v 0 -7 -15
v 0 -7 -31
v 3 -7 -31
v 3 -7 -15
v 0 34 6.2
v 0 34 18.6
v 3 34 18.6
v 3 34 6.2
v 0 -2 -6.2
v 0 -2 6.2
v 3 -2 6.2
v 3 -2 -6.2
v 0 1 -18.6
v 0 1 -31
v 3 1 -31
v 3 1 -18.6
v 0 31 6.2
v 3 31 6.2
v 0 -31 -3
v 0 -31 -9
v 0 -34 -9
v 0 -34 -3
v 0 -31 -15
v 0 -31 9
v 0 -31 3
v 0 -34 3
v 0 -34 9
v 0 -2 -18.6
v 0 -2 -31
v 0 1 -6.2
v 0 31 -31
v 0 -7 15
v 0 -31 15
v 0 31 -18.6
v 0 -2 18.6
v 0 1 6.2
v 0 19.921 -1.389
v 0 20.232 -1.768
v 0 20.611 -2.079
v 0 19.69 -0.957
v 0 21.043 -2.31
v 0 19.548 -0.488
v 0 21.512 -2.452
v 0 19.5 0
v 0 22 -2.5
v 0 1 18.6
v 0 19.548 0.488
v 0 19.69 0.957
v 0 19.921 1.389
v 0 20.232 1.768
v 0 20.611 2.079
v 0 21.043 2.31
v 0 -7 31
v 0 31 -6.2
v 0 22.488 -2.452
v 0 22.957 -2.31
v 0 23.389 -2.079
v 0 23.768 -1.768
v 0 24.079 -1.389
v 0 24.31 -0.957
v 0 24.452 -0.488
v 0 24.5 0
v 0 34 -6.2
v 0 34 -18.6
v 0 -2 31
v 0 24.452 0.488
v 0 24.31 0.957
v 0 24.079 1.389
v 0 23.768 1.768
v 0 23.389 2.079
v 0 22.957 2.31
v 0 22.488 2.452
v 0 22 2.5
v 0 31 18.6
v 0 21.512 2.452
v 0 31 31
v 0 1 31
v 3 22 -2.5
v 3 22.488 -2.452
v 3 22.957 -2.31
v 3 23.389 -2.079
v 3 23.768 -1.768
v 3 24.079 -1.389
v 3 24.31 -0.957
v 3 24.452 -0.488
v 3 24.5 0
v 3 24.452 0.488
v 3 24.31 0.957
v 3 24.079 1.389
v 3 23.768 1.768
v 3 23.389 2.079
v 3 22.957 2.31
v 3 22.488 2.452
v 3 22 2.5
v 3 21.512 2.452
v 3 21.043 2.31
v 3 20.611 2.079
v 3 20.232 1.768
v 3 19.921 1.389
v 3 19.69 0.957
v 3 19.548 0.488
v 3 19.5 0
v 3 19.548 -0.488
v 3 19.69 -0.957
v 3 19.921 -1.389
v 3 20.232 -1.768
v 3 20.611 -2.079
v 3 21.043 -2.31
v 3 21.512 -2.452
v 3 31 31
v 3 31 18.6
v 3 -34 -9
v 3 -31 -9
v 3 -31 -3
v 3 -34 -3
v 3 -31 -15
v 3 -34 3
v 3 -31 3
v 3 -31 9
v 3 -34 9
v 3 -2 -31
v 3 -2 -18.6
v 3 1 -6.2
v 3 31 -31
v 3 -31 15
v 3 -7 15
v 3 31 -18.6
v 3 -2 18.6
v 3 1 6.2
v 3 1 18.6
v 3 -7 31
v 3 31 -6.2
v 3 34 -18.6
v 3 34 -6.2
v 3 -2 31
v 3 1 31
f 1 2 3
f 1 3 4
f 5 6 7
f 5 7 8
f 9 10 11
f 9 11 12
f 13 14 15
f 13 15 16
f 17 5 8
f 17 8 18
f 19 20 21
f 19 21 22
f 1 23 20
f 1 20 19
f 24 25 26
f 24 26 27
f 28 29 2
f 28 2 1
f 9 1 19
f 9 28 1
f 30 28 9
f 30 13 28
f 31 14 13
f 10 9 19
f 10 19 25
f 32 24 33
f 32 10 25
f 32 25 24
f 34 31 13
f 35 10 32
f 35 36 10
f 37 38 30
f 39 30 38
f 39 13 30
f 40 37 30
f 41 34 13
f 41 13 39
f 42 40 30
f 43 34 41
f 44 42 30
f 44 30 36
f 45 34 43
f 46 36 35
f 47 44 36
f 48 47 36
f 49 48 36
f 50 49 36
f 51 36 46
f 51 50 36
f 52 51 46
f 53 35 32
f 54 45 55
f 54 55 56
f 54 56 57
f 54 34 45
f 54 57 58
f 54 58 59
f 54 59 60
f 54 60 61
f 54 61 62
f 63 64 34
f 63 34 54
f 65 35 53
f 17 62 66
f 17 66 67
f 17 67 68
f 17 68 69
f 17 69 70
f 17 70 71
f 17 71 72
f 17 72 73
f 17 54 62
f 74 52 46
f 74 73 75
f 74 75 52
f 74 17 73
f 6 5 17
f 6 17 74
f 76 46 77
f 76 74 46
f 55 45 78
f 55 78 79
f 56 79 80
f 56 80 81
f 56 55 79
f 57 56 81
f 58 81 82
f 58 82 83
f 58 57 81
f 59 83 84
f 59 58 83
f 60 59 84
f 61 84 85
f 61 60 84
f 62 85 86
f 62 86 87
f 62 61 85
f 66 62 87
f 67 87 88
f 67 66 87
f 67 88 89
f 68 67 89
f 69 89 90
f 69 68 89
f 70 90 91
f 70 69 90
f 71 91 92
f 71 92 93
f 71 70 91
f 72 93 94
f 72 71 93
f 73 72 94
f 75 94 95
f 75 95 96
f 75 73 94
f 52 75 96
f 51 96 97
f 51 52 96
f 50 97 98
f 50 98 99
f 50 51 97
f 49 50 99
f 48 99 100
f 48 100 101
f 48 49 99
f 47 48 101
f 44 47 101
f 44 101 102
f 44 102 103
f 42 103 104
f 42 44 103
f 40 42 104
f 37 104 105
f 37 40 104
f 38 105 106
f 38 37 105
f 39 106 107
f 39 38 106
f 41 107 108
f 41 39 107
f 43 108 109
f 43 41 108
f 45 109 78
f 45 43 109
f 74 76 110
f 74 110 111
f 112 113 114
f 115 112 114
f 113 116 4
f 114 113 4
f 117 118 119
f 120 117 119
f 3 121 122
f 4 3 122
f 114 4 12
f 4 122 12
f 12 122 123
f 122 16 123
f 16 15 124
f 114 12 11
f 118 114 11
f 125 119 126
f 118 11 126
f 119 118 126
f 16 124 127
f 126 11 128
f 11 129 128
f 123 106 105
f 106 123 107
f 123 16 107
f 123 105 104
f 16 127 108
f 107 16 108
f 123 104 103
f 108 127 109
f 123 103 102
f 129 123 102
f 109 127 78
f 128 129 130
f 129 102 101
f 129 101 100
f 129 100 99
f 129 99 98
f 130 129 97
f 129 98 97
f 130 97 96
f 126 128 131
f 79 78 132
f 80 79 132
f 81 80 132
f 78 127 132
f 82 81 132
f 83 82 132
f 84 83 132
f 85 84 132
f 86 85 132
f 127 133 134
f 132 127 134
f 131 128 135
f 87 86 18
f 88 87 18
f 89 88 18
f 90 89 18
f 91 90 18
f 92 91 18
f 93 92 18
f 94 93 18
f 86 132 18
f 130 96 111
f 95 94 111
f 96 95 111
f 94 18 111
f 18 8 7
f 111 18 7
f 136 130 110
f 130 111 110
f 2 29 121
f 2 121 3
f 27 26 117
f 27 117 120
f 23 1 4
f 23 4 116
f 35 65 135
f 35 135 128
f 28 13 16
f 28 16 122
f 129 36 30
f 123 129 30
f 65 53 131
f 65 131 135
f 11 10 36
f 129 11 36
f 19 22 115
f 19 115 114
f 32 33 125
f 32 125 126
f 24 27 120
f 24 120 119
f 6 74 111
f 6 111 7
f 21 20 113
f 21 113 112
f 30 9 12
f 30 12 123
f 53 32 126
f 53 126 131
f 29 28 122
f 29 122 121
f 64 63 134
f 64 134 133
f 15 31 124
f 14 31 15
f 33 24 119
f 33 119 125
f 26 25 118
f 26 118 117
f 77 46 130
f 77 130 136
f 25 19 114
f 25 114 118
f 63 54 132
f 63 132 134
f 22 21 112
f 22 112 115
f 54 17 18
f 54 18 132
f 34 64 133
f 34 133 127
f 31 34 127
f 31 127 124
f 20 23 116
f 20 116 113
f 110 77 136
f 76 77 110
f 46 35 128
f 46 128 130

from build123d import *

# Parameters (mm, degrees)
SKETCH1_R           = 2.5
SKETCH1_W           = 12.4
SKETCH1_H           = 3
BOSS_EXTRUDE3_DEPTH = 3


with BuildPart() as part:
    # Sketch1 → Boss-Extrude3 (new body)
    with BuildSketch(Plane(origin=(0, 0, 0), x_dir=(0, 0, -1), z_dir=(1, 0, 0))):
        Polygon((31, -2), (31, -7), (15, -7), (15, -31), (9, -31), (9, -34), (3, -34), (3, -31), (-3, -31), (-3, -34), (-9, -34), (-9, -31), (-15, -31), (-15, -7), (-31, -7), (-31, -2), (-18.6, -2), (-18.6, 1), (-31, 1), (-31, 31), (-18.6, 31), (-18.6, 34), (-6.2, 34), (-6.2, 31), (6.2, 31), (6.2, 34), (18.6, 34), (18.6, 31), (31, 31), (31, 1), (18.6, 1), (18.6, -2), align=None)
        with Locations((0, 22)):
            Circle(SKETCH1_R, mode=Mode.SUBTRACT)
        with Locations((0, -0.5)):
            Rectangle(SKETCH1_W, SKETCH1_H, mode=Mode.SUBTRACT)
    extrude(amount=BOSS_EXTRUDE3_DEPTH)


solid = part.part
